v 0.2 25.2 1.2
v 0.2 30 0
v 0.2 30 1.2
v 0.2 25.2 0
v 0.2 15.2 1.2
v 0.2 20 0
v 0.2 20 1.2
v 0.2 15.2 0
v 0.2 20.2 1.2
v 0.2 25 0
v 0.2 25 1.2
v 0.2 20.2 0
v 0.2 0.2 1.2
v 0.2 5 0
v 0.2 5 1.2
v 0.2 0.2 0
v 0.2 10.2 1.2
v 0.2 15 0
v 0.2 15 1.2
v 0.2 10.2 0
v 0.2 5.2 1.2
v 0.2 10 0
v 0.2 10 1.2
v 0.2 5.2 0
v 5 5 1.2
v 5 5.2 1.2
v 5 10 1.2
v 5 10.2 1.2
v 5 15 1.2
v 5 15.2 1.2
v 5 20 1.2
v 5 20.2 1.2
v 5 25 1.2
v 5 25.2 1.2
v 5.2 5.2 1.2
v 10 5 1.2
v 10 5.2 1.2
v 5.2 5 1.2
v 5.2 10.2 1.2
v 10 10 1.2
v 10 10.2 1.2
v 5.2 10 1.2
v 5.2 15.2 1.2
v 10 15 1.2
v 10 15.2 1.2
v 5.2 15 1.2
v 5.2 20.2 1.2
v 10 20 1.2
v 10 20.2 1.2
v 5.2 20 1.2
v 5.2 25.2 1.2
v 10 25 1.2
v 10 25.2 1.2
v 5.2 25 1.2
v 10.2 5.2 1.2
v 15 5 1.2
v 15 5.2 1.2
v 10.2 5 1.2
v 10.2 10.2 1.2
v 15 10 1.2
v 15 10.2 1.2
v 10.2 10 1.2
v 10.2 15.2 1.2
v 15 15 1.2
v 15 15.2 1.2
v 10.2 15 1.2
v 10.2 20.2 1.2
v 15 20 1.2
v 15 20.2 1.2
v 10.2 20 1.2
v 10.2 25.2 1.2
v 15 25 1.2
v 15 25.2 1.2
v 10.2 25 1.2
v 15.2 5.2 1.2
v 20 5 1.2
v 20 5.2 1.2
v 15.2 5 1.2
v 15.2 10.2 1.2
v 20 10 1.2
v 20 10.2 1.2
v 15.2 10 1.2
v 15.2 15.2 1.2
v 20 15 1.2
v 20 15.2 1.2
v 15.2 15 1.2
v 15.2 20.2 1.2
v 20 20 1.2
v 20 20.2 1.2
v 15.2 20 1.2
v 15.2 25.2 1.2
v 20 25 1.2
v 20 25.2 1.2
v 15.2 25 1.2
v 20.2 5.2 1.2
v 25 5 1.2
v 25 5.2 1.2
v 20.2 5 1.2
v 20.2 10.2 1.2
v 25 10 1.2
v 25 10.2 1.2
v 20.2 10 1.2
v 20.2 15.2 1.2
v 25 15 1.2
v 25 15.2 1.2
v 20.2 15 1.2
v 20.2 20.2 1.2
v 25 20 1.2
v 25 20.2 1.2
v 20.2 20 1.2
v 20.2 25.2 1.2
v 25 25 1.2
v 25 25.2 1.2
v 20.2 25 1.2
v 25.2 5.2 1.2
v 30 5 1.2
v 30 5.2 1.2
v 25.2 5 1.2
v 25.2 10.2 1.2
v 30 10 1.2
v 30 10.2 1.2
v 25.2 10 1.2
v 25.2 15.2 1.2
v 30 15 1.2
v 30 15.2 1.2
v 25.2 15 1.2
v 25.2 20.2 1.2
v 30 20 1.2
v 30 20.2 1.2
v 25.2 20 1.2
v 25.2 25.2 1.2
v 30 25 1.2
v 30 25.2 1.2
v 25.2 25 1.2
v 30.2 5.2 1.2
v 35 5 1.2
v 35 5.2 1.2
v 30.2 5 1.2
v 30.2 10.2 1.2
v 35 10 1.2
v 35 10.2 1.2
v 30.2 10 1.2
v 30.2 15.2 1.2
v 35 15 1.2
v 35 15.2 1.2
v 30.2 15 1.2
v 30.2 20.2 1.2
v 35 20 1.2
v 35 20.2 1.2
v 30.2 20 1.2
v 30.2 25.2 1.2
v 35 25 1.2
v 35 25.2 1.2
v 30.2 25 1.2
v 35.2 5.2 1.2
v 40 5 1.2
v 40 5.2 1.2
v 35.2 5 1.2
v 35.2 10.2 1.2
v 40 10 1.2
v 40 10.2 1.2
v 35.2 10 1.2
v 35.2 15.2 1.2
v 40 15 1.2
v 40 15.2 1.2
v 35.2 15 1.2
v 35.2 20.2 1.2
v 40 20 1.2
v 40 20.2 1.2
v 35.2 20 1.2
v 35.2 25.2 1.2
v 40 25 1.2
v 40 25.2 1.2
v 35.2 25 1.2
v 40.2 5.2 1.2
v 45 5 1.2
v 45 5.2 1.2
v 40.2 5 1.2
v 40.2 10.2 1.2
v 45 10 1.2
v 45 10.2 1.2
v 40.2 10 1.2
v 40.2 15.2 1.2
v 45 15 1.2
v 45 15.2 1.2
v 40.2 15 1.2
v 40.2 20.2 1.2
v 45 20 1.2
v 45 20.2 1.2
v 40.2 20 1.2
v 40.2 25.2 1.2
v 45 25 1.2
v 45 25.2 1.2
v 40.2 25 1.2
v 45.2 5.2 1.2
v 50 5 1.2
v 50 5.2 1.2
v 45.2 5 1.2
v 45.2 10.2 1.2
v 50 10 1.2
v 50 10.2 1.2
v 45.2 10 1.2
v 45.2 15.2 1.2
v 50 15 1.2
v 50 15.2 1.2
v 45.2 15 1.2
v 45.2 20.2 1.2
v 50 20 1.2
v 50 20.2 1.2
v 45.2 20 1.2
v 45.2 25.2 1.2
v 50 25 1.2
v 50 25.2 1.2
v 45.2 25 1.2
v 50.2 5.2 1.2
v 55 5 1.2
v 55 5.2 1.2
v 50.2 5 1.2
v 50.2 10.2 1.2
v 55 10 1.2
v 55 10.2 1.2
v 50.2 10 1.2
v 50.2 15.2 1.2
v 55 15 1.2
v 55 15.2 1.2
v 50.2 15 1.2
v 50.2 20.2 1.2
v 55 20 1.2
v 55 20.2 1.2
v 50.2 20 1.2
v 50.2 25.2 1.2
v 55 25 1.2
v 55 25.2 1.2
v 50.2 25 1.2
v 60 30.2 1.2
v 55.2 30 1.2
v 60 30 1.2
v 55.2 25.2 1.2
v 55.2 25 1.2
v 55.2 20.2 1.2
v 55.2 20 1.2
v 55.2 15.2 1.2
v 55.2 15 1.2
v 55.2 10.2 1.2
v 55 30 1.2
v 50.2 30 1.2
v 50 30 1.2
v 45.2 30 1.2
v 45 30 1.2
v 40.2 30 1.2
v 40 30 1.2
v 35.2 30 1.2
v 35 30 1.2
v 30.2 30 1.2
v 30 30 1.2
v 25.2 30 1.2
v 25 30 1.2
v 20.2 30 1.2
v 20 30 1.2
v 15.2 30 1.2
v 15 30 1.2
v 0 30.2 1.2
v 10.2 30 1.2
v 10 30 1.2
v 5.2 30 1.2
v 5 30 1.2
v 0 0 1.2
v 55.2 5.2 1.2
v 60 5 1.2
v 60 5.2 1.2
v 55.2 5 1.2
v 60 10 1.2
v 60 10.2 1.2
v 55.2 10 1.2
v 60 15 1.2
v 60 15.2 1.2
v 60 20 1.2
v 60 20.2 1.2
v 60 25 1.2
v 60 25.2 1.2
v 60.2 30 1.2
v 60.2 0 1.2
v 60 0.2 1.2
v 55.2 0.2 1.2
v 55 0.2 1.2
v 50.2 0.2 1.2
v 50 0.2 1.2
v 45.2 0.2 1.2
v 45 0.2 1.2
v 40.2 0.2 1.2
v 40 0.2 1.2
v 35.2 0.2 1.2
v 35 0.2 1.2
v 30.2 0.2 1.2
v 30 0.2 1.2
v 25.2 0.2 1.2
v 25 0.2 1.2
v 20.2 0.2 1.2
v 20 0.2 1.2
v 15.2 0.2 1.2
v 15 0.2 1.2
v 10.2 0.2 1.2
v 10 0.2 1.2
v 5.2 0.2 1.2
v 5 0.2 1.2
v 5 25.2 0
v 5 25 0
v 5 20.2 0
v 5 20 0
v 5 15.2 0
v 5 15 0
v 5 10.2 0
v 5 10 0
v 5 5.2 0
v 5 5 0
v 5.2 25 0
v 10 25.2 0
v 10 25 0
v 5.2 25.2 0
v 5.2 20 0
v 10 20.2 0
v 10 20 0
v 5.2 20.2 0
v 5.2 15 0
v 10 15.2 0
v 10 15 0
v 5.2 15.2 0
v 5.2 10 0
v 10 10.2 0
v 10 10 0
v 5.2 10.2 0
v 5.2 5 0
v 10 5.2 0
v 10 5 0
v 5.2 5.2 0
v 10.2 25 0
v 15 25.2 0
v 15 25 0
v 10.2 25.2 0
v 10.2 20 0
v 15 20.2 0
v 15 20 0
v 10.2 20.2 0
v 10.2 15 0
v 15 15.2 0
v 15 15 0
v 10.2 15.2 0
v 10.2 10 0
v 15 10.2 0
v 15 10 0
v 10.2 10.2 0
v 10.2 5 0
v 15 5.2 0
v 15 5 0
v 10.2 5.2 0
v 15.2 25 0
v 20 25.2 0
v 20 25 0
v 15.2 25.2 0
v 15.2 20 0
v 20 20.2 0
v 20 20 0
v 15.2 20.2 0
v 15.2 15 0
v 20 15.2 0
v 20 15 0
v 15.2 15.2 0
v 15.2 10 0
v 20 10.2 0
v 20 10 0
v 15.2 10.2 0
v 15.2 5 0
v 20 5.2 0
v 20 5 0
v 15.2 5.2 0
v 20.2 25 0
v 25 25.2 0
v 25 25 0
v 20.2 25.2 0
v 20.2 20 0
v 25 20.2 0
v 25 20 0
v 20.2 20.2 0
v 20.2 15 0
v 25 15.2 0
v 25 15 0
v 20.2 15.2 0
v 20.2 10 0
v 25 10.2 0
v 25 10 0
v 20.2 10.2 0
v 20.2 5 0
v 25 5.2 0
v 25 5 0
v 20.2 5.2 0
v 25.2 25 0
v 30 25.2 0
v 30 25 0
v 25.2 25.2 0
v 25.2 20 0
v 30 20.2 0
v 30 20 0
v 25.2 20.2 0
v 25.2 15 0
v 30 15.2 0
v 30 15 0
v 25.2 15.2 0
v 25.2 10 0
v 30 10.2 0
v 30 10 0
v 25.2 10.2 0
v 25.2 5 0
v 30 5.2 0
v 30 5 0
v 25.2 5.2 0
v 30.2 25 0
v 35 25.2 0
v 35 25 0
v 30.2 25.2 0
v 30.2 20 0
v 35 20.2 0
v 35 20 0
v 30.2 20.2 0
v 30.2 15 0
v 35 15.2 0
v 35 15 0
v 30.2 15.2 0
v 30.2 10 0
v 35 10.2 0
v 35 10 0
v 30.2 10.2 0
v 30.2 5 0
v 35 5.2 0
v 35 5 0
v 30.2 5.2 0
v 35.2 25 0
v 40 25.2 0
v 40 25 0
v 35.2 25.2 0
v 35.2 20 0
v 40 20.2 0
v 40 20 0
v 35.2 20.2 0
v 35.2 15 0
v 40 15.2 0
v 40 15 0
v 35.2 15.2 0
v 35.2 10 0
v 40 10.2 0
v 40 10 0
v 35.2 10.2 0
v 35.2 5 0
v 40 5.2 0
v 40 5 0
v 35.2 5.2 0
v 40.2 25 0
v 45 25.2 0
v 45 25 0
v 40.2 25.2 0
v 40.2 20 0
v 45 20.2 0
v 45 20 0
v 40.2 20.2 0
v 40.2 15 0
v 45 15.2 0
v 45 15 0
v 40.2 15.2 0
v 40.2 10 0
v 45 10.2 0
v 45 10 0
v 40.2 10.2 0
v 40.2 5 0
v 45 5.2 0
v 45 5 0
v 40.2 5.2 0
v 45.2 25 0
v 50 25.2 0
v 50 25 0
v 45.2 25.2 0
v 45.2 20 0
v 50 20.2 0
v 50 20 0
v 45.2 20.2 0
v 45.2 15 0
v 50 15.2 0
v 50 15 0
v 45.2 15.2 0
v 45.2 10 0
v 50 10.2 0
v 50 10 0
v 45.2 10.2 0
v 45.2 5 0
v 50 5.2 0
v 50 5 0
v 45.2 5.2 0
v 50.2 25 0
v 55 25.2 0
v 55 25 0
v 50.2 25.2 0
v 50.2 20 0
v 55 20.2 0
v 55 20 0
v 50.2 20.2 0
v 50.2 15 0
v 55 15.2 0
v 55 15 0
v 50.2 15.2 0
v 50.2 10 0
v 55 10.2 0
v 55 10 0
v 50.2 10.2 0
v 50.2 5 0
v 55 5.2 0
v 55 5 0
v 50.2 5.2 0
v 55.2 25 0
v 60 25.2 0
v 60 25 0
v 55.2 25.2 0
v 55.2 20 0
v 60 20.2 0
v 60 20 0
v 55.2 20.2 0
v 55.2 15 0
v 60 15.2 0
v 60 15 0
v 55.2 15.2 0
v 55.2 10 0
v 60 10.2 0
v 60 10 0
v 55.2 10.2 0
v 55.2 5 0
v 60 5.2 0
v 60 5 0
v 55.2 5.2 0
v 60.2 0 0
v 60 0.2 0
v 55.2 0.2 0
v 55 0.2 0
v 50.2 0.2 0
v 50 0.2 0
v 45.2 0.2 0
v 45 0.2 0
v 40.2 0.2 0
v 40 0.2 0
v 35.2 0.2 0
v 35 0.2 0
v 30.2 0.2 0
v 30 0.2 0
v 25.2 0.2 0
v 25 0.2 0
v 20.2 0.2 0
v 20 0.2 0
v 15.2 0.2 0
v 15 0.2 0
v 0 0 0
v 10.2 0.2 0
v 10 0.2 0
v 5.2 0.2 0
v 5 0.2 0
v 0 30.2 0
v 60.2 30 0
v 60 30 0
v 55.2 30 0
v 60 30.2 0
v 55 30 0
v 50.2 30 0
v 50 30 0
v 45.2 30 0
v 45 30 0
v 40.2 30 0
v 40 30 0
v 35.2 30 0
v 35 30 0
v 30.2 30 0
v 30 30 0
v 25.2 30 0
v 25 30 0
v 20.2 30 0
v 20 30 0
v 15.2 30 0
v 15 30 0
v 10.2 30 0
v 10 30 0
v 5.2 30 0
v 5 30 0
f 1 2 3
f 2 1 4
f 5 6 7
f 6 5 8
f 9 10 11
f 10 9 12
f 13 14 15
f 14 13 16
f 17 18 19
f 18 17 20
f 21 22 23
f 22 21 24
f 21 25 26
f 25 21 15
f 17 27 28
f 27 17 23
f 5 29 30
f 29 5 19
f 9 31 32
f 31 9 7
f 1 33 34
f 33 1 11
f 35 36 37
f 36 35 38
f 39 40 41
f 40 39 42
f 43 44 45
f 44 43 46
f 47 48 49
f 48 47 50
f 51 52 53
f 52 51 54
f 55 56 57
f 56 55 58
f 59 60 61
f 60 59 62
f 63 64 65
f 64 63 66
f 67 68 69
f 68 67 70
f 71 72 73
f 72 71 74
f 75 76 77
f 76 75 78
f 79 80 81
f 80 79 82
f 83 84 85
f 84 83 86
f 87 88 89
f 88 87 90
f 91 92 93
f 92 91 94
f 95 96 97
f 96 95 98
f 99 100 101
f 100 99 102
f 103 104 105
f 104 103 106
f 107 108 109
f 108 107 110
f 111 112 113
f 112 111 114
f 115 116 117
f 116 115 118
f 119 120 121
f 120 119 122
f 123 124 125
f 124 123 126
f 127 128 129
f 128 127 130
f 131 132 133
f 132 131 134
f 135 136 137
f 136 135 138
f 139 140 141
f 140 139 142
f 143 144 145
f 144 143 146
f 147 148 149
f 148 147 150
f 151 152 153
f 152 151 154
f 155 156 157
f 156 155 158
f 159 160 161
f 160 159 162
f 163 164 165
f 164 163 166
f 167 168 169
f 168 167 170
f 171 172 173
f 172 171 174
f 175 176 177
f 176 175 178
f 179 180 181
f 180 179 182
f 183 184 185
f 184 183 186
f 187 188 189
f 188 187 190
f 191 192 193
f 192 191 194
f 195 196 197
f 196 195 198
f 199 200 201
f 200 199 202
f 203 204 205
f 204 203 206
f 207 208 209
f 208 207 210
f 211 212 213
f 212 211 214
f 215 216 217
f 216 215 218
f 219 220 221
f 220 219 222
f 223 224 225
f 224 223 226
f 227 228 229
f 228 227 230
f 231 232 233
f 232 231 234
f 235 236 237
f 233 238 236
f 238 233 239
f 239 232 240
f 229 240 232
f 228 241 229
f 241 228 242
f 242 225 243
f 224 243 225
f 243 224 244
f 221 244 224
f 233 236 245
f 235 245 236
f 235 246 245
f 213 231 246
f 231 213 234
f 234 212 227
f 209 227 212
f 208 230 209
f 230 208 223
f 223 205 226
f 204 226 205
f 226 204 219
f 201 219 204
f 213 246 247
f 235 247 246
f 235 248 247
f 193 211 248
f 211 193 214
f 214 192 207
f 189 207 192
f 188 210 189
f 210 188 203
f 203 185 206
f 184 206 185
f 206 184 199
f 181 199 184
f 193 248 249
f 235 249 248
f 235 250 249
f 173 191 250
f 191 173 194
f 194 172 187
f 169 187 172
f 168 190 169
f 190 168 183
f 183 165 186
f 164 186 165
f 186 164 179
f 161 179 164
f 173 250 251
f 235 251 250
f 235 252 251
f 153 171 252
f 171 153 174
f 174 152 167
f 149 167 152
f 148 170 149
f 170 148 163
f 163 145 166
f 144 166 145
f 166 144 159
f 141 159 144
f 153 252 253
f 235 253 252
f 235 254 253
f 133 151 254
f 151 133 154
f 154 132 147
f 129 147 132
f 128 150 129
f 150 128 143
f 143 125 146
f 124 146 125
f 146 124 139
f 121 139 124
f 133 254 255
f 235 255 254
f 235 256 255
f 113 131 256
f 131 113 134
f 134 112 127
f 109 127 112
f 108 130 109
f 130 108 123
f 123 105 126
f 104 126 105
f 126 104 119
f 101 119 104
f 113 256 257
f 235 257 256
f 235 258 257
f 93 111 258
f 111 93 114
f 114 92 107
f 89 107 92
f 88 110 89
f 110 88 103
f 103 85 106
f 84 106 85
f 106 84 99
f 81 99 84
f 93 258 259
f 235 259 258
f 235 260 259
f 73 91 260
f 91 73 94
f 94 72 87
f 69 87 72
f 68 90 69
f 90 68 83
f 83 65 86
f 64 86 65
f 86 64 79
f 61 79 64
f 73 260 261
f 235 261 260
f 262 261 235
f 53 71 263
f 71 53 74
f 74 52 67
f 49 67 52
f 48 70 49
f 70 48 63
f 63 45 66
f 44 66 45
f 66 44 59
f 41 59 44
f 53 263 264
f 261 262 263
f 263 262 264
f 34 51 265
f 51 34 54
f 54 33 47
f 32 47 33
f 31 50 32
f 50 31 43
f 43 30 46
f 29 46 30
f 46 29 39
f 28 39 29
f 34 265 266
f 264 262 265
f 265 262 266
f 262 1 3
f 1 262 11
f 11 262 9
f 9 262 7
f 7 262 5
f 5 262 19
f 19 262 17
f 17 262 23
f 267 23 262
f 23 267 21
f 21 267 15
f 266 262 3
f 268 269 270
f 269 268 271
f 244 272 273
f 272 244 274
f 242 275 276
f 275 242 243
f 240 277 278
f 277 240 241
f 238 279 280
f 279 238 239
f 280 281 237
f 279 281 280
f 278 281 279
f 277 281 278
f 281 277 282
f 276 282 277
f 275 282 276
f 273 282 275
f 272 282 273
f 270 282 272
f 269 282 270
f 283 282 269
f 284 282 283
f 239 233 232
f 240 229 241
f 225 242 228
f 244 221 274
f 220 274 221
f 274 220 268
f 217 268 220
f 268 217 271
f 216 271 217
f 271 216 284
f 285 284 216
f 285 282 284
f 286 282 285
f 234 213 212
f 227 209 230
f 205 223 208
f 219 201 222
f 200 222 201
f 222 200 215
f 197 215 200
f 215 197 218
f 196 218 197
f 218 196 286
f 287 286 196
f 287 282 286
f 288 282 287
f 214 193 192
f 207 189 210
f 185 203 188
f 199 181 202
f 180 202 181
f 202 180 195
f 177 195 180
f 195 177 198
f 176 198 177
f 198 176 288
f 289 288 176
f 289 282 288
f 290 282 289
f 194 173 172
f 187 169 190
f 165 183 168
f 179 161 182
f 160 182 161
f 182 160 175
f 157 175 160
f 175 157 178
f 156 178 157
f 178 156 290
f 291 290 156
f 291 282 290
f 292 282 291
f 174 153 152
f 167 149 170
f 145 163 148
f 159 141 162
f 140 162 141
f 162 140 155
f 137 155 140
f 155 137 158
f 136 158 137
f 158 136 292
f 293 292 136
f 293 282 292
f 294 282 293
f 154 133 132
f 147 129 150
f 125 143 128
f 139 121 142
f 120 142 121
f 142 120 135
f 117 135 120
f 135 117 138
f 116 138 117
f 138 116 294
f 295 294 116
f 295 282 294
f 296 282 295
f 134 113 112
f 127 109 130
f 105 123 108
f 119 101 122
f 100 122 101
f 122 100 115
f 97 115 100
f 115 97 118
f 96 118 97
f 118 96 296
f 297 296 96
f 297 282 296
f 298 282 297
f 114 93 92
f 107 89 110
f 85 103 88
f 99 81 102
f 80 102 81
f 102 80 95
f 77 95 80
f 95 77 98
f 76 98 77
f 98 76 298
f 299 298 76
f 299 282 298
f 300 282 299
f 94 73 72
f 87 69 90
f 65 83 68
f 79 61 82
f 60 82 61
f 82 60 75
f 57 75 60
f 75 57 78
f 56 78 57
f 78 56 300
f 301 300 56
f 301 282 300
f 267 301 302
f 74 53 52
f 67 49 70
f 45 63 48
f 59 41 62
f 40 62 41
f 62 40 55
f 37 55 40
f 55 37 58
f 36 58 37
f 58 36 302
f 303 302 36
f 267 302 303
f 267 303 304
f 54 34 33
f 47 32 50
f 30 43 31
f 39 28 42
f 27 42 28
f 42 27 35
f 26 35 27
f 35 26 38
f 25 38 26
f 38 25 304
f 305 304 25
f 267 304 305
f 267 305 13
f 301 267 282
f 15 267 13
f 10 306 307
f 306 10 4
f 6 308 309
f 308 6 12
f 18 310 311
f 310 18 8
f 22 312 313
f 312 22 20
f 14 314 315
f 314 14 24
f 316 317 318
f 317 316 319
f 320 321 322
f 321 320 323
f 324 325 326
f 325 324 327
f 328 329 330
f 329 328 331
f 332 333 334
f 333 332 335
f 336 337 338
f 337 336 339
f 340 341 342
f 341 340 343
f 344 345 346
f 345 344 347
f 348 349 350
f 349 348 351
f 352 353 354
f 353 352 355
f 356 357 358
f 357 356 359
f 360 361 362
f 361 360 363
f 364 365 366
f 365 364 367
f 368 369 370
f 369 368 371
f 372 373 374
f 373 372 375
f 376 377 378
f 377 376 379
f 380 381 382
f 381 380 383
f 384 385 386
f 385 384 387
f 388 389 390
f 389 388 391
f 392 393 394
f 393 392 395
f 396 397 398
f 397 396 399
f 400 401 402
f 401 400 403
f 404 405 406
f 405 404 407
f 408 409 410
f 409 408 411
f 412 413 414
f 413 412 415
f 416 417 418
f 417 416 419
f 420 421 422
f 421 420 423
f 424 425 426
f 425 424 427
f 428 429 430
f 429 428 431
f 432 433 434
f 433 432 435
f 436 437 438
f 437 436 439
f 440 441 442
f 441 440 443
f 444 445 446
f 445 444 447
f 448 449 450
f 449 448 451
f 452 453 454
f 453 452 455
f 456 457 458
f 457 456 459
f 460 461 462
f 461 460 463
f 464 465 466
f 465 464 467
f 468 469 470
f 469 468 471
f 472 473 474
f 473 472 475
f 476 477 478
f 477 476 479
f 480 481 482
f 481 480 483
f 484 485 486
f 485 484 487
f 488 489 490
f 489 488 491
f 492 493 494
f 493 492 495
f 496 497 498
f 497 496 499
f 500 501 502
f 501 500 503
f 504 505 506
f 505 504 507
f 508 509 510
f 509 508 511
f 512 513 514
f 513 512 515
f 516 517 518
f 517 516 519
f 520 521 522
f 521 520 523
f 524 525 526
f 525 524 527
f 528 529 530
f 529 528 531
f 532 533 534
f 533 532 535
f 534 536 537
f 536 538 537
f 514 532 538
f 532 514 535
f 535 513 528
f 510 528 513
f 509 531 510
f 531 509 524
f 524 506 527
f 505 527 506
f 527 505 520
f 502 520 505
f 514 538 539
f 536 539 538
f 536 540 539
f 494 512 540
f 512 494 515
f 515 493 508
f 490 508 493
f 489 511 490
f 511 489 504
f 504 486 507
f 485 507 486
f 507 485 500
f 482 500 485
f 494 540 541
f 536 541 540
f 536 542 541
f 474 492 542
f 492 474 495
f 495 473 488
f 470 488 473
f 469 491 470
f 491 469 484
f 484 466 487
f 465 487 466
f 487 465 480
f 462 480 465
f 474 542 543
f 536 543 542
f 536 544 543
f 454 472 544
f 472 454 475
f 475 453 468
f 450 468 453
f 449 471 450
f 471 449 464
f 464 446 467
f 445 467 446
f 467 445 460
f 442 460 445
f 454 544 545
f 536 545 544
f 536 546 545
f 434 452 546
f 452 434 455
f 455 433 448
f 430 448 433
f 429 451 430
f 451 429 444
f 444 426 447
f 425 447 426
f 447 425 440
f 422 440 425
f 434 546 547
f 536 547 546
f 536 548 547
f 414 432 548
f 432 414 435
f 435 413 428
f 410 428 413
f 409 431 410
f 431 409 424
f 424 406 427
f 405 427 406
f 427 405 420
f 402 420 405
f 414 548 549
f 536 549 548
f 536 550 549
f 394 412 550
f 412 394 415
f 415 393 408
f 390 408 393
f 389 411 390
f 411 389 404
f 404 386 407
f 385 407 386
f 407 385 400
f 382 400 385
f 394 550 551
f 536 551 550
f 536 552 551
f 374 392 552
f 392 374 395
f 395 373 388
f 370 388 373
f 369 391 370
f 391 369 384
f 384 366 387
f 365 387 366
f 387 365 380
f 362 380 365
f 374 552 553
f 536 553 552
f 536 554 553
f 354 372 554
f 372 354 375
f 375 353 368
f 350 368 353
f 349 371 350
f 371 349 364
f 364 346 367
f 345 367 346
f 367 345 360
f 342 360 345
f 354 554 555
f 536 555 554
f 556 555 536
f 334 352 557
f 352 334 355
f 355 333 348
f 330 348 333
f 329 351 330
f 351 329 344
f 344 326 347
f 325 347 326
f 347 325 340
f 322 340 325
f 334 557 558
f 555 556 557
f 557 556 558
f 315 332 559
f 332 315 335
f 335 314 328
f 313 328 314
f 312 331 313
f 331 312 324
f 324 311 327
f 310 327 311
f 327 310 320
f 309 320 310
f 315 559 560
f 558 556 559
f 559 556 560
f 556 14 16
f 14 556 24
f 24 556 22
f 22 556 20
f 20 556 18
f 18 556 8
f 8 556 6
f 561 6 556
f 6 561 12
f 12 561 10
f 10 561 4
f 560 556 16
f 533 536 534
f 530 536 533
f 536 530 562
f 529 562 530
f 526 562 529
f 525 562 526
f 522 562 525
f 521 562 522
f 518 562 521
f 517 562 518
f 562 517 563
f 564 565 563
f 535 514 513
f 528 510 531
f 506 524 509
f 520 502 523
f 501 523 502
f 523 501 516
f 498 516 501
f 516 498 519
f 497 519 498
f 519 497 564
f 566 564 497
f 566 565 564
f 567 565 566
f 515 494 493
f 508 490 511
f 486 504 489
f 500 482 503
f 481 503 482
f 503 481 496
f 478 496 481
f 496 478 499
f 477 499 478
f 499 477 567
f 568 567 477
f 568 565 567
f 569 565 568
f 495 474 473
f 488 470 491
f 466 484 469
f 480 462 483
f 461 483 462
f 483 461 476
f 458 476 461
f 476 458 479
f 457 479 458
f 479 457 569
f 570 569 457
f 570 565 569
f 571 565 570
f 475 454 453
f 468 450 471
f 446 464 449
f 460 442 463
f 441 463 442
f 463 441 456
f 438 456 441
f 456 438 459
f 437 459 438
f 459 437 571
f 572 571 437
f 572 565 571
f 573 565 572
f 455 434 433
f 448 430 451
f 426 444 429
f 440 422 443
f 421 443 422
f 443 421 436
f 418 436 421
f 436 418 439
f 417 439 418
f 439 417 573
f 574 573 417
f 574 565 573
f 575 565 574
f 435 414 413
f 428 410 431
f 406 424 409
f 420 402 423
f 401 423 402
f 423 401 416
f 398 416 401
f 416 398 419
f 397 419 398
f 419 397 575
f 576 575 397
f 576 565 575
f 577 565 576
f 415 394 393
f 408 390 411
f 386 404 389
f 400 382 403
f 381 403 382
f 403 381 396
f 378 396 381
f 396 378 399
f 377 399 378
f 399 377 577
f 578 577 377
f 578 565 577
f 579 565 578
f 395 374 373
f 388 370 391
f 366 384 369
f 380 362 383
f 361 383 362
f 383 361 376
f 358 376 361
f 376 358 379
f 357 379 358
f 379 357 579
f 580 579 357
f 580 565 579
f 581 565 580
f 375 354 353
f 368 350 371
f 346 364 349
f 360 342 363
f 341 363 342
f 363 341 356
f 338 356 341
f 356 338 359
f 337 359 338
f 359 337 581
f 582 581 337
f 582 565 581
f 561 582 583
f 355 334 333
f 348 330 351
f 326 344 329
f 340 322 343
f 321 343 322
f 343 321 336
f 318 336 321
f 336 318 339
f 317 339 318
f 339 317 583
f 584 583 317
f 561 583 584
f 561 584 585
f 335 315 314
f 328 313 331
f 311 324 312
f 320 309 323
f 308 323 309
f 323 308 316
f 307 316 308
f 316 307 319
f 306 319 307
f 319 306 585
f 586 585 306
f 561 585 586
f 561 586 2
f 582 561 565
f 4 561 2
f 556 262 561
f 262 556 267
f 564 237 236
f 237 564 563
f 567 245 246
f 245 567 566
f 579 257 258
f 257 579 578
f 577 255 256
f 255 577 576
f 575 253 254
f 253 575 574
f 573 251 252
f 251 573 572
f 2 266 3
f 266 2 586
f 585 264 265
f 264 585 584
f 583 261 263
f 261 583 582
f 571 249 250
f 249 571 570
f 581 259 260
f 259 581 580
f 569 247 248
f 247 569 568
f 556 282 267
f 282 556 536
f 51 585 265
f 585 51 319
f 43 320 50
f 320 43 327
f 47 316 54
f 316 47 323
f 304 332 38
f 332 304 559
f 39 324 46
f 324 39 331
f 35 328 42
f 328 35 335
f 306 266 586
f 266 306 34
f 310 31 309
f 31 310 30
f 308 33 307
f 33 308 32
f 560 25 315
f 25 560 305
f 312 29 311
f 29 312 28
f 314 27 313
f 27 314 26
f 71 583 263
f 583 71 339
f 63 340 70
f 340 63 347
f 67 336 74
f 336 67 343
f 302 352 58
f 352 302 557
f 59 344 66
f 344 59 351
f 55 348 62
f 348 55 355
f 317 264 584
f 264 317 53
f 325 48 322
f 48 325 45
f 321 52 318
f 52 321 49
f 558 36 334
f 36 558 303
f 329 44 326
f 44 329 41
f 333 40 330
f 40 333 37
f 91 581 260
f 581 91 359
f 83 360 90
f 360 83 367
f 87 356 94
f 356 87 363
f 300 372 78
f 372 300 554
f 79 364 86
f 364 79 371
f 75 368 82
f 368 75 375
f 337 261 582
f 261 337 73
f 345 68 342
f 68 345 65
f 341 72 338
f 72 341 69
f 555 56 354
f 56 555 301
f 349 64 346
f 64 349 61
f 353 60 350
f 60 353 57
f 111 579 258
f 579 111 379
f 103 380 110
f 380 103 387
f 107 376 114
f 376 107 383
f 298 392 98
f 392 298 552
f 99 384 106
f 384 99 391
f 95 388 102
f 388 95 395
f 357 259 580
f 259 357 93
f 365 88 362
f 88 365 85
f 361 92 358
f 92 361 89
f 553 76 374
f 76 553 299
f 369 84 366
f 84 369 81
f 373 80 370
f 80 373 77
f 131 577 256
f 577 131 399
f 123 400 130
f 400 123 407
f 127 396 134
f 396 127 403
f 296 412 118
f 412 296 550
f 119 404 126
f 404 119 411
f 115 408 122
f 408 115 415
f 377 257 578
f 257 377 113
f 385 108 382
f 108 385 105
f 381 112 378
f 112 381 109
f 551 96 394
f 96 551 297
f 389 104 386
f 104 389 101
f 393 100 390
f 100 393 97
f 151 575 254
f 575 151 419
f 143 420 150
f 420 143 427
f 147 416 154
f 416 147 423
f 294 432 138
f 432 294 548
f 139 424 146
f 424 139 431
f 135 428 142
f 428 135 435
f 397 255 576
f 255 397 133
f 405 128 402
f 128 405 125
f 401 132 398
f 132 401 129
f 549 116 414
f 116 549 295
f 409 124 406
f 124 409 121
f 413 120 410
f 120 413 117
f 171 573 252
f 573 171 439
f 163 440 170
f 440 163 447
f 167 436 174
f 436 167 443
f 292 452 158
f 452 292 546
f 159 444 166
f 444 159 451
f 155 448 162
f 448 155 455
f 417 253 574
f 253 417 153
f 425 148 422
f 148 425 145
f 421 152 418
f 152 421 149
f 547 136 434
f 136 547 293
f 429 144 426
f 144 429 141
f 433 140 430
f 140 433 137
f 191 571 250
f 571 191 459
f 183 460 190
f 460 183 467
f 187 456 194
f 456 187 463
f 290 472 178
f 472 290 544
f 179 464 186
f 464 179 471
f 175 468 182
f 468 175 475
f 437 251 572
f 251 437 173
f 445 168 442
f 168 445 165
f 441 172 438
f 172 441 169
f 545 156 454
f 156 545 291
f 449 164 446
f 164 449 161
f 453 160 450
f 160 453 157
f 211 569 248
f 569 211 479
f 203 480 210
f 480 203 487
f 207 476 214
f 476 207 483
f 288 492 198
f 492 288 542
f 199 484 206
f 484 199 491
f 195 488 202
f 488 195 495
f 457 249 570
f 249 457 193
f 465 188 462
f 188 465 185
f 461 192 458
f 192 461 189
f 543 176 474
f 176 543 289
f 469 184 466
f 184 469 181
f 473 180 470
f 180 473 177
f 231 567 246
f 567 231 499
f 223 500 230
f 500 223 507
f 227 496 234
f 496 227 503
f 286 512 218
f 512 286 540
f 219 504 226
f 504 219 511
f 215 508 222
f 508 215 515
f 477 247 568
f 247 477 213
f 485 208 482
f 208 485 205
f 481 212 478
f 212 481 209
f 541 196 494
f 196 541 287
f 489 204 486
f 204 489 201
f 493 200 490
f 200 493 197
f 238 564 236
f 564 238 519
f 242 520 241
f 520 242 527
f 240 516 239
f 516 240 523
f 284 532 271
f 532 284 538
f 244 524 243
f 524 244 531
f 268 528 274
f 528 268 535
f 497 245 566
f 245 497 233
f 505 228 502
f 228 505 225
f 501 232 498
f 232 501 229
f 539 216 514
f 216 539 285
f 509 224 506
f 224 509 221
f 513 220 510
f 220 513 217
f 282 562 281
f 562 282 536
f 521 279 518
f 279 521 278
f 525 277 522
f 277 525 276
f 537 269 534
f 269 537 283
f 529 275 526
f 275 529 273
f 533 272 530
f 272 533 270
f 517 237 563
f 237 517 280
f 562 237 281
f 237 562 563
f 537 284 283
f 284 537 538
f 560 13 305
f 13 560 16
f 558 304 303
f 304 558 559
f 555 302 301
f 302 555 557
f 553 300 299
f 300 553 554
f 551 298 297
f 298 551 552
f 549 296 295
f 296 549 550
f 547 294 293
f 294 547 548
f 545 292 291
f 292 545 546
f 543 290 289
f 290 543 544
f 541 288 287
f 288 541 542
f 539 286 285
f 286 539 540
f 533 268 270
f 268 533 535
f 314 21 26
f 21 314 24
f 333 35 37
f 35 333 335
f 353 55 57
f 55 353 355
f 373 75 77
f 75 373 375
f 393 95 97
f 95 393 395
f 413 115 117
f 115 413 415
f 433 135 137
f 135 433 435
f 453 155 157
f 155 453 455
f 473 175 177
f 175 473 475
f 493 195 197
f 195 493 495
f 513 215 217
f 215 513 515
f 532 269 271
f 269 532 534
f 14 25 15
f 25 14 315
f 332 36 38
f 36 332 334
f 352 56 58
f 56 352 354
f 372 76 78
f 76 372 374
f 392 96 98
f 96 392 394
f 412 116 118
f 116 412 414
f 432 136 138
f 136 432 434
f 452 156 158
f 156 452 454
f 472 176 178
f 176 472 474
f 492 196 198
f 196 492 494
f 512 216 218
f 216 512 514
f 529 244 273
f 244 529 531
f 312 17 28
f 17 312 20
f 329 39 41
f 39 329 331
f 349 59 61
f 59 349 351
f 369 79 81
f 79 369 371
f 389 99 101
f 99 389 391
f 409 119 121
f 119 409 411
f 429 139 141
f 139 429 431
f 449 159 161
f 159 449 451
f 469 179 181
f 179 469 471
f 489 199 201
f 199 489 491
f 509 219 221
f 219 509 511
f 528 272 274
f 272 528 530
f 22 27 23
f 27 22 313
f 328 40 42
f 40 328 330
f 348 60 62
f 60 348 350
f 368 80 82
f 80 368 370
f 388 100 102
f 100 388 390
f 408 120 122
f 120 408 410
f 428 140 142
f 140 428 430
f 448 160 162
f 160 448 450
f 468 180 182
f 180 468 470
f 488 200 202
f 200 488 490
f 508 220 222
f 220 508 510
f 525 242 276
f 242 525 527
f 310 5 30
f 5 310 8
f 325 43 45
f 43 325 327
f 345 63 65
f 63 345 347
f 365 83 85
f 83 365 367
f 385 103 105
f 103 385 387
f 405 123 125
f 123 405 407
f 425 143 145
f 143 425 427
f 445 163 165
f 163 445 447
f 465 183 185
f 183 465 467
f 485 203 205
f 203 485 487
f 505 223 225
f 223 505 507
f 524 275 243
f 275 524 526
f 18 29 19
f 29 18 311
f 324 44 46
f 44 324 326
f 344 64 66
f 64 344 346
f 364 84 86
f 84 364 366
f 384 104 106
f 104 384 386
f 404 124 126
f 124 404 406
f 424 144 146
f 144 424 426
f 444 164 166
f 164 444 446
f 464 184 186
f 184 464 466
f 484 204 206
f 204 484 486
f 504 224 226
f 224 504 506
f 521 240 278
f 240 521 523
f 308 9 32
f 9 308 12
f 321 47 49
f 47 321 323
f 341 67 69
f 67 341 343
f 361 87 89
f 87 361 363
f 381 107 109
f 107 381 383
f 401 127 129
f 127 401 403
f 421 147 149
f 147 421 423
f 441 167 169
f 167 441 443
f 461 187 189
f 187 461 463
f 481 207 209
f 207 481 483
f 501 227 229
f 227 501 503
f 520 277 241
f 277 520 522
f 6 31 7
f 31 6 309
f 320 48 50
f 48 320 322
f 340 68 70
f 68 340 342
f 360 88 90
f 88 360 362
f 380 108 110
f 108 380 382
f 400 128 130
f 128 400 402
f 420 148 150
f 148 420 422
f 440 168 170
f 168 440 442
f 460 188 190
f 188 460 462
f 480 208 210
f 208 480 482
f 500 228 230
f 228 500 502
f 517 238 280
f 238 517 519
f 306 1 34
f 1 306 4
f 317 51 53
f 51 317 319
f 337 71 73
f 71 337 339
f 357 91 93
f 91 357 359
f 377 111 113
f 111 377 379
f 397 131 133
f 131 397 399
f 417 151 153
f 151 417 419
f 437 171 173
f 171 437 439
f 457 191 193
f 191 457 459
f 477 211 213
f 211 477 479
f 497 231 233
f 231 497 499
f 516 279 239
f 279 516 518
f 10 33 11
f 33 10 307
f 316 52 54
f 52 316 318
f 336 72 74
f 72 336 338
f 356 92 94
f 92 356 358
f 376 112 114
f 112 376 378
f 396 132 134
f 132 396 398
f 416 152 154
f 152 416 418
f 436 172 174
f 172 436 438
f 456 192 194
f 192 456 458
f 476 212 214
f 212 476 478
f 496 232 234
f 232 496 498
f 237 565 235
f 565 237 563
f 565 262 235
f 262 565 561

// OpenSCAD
$fn = 100;

module grid(rows, columns) {
  size = 5;
  for(i = [0 : columns]) {
    translate([i * size, 0, 0])
      cube([0.2, size*rows, 1.2]);
  }

  for(i = [0 : rows]) {
    translate([0, i*size, 0])
      cube([size*columns, 0.2, 1.2]);
  }
}


grid(rows=6, columns=12);
